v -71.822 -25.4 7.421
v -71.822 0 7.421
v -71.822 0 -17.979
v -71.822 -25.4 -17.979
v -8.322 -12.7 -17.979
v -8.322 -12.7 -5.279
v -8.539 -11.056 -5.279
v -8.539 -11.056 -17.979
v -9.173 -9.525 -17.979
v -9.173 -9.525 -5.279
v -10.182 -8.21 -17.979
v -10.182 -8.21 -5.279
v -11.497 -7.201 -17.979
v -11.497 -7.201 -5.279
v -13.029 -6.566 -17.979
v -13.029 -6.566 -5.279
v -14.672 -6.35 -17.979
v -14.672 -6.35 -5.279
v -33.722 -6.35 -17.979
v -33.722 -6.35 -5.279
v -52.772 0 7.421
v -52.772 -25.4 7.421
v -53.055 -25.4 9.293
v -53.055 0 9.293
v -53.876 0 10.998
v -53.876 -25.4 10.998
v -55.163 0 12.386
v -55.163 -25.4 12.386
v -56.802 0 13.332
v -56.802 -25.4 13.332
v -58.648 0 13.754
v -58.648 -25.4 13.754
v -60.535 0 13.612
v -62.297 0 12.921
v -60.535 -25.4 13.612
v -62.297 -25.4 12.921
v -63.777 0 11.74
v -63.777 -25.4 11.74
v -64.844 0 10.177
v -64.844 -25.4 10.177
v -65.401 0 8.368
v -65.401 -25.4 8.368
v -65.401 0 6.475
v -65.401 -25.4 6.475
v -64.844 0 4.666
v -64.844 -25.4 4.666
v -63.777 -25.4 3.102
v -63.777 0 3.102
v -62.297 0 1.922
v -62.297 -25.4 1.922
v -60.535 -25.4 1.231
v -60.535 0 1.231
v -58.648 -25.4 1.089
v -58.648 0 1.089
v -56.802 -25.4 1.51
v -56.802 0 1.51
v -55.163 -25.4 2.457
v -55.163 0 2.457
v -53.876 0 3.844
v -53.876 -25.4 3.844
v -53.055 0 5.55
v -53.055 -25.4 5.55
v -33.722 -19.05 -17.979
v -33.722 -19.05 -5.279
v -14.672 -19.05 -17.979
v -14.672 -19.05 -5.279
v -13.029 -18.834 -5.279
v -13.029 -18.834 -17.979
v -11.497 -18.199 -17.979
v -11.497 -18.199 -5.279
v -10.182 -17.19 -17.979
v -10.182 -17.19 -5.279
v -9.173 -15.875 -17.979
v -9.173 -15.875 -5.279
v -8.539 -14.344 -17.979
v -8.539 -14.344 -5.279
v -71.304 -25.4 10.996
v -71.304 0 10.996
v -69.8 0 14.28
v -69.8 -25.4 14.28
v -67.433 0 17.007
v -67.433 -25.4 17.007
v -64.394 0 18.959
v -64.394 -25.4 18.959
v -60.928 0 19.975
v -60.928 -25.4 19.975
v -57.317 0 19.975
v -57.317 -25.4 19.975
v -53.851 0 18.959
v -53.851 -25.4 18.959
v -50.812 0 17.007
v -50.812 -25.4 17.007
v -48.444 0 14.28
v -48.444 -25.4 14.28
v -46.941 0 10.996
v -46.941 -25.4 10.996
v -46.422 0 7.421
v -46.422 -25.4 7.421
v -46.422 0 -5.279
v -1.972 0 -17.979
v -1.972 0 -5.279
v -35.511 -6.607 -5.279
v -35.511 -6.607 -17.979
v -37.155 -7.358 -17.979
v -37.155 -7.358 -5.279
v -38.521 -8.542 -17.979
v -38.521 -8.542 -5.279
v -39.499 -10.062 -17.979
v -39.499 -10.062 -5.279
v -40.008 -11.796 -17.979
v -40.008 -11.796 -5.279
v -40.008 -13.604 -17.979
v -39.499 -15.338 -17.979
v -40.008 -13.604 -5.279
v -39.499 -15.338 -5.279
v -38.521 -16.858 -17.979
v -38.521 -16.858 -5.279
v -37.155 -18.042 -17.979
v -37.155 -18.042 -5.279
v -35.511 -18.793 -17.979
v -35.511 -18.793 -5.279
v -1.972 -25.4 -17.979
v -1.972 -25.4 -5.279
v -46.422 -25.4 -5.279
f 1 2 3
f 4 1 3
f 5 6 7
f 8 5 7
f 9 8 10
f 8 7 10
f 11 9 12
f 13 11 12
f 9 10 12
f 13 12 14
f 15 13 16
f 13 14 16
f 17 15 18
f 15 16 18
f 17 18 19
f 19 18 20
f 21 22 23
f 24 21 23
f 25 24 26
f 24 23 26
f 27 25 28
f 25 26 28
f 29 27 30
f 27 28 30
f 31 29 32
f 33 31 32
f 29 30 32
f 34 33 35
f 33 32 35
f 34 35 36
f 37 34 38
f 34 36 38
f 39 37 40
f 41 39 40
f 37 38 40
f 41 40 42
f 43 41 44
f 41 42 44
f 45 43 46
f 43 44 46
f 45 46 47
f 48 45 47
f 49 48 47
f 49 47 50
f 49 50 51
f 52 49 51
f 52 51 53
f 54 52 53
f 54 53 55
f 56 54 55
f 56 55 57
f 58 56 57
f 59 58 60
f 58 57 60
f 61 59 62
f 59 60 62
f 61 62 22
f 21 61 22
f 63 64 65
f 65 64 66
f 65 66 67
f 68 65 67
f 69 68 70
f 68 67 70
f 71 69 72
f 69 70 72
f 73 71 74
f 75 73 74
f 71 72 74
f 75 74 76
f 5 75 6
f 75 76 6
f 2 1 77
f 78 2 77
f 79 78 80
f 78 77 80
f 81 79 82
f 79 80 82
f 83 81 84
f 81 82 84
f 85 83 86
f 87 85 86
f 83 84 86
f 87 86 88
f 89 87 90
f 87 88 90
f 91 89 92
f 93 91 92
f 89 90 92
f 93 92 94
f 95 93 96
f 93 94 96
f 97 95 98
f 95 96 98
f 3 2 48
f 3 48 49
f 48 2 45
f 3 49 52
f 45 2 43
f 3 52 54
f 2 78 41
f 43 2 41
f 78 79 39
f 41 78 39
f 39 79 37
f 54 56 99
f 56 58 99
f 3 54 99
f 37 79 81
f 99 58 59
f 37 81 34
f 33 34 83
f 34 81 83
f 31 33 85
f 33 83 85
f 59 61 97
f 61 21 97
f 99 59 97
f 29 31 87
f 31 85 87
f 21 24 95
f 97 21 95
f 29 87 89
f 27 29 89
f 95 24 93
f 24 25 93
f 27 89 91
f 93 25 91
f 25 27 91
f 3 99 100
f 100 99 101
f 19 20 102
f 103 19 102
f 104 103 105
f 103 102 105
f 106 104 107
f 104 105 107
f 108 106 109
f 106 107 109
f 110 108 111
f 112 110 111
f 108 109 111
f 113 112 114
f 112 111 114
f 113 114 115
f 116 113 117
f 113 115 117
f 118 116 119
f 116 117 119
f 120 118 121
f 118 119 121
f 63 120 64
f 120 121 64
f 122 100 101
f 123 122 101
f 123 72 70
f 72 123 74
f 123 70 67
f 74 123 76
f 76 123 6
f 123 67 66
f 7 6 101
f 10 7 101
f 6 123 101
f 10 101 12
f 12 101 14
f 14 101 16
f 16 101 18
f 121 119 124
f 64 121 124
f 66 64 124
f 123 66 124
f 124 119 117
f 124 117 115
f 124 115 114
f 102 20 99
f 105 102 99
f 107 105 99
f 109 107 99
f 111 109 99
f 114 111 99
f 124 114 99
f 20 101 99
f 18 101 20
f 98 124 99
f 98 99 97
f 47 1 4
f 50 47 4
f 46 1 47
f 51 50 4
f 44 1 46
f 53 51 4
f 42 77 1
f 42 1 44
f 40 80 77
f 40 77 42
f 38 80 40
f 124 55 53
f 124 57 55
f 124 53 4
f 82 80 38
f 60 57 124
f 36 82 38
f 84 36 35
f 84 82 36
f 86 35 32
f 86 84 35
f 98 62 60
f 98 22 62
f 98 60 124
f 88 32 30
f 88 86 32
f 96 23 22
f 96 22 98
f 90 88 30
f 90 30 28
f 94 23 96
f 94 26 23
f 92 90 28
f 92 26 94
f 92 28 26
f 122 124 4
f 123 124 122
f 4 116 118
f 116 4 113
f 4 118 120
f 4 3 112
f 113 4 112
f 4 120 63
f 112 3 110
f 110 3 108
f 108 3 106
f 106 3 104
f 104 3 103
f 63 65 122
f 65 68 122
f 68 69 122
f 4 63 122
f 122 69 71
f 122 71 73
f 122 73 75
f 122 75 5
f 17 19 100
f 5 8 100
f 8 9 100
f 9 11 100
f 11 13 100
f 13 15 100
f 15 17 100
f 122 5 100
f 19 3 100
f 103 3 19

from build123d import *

# Parameters (mm, degrees)
F1_DEPTH = 25.4
F4_DEPTH = 12.7
F2_R     = 6.35
F5_DEPTH = 25.4


# Not quite as in the source:
# - ends of sketch curves that miss each other by under 0.0002 mm in the source are joined


with BuildPart() as f1:
    # F0 (on Front) → F1 (new body)
    with BuildSketch(Plane.XZ):
        Polygon((-46.4223937518, 20.1214007731), (-71.8223937518, 20.1214007731), (-71.8223937518, -17.9785992269), (-1.9723937518, -17.9785992269), (-1.9723937518, -5.2785992269), (-46.4223937518, -5.2785992269), align=None)
    extrude(amount=F1_DEPTH)

    # F3 (on face) → F4 (cut)
    with BuildSketch(Plane.XY.offset(-5.2785992269)):
        with BuildLine():
            ThreePointArc((-8.3223937518, -12.6999999235), (-10.1822656913, -8.2098718629), (-14.6723937518, -6.3499999235))
            ThreePointArc((-14.6723937518, -6.3499999235), (-21.0223937518, -12.6999999235), (-14.6723937518, -19.0499999235))
            ThreePointArc((-14.6723937518, -19.0499999235), (-10.1822656913, -17.190127984), (-8.3223937518, -12.6999999235))
        make_face()
        with BuildLine():
            ThreePointArc((-33.7223937518, -6.3499998086), (-29.2322656913, -8.2098717481), (-27.3723937518, -12.6999998086))
            ThreePointArc((-27.3723937518, -12.6999998086), (-29.2322656913, -17.1901278692), (-33.7223937518, -19.0499998086))
            Line((-33.7223937518, -19.0499998086), (-14.6723937518, -19.0499998086))
            ThreePointArc((-14.6723937518, -19.0499998086), (-21.0223937518, -12.6999999235), (-14.6723937518, -6.3499999235))
            Line((-14.6723937518, -6.3499999235), (-33.7223937518, -6.3499998086))
        make_face()
        with BuildLine():
            ThreePointArc((-33.7223937518, -19.0499998086), (-29.2322656913, -17.1901278692), (-27.3723937518, -12.6999998086))
            ThreePointArc((-27.3723937518, -12.6999998086), (-29.2322656913, -8.2098717481), (-33.7223937518, -6.3499998086))
            ThreePointArc((-33.7223937518, -6.3499998086), (-40.0723937518, -12.6999998086), (-33.7223937518, -19.0499998086))
        make_face()
    extrude(amount=-F4_DEPTH, mode=Mode.SUBTRACT)

    # F2 (on face) → F5 (cut)
    with BuildSketch(Plane.XZ.offset(25.4)):
        with Locations((-59.1223937518, 7.4214007731)):
            Circle(F2_R)
        with BuildLine():
            ThreePointArc((-71.8223937518, 7.4214007731), (-59.1223937518, 20.1043120223), (-46.4223937518, 7.4214007731))
            Line((-46.4223937518, 7.4214007731), (-46.4223937518, 20.1214007731))
            Line((-46.4223937518, 20.1214007731), (-71.8223937518, 20.1214007731))
            Line((-71.8223937518, 20.1214007731), (-71.8223937518, 7.4214007731))
        make_face()
    extrude(amount=-F5_DEPTH, mode=Mode.SUBTRACT)


solid = f1.part
